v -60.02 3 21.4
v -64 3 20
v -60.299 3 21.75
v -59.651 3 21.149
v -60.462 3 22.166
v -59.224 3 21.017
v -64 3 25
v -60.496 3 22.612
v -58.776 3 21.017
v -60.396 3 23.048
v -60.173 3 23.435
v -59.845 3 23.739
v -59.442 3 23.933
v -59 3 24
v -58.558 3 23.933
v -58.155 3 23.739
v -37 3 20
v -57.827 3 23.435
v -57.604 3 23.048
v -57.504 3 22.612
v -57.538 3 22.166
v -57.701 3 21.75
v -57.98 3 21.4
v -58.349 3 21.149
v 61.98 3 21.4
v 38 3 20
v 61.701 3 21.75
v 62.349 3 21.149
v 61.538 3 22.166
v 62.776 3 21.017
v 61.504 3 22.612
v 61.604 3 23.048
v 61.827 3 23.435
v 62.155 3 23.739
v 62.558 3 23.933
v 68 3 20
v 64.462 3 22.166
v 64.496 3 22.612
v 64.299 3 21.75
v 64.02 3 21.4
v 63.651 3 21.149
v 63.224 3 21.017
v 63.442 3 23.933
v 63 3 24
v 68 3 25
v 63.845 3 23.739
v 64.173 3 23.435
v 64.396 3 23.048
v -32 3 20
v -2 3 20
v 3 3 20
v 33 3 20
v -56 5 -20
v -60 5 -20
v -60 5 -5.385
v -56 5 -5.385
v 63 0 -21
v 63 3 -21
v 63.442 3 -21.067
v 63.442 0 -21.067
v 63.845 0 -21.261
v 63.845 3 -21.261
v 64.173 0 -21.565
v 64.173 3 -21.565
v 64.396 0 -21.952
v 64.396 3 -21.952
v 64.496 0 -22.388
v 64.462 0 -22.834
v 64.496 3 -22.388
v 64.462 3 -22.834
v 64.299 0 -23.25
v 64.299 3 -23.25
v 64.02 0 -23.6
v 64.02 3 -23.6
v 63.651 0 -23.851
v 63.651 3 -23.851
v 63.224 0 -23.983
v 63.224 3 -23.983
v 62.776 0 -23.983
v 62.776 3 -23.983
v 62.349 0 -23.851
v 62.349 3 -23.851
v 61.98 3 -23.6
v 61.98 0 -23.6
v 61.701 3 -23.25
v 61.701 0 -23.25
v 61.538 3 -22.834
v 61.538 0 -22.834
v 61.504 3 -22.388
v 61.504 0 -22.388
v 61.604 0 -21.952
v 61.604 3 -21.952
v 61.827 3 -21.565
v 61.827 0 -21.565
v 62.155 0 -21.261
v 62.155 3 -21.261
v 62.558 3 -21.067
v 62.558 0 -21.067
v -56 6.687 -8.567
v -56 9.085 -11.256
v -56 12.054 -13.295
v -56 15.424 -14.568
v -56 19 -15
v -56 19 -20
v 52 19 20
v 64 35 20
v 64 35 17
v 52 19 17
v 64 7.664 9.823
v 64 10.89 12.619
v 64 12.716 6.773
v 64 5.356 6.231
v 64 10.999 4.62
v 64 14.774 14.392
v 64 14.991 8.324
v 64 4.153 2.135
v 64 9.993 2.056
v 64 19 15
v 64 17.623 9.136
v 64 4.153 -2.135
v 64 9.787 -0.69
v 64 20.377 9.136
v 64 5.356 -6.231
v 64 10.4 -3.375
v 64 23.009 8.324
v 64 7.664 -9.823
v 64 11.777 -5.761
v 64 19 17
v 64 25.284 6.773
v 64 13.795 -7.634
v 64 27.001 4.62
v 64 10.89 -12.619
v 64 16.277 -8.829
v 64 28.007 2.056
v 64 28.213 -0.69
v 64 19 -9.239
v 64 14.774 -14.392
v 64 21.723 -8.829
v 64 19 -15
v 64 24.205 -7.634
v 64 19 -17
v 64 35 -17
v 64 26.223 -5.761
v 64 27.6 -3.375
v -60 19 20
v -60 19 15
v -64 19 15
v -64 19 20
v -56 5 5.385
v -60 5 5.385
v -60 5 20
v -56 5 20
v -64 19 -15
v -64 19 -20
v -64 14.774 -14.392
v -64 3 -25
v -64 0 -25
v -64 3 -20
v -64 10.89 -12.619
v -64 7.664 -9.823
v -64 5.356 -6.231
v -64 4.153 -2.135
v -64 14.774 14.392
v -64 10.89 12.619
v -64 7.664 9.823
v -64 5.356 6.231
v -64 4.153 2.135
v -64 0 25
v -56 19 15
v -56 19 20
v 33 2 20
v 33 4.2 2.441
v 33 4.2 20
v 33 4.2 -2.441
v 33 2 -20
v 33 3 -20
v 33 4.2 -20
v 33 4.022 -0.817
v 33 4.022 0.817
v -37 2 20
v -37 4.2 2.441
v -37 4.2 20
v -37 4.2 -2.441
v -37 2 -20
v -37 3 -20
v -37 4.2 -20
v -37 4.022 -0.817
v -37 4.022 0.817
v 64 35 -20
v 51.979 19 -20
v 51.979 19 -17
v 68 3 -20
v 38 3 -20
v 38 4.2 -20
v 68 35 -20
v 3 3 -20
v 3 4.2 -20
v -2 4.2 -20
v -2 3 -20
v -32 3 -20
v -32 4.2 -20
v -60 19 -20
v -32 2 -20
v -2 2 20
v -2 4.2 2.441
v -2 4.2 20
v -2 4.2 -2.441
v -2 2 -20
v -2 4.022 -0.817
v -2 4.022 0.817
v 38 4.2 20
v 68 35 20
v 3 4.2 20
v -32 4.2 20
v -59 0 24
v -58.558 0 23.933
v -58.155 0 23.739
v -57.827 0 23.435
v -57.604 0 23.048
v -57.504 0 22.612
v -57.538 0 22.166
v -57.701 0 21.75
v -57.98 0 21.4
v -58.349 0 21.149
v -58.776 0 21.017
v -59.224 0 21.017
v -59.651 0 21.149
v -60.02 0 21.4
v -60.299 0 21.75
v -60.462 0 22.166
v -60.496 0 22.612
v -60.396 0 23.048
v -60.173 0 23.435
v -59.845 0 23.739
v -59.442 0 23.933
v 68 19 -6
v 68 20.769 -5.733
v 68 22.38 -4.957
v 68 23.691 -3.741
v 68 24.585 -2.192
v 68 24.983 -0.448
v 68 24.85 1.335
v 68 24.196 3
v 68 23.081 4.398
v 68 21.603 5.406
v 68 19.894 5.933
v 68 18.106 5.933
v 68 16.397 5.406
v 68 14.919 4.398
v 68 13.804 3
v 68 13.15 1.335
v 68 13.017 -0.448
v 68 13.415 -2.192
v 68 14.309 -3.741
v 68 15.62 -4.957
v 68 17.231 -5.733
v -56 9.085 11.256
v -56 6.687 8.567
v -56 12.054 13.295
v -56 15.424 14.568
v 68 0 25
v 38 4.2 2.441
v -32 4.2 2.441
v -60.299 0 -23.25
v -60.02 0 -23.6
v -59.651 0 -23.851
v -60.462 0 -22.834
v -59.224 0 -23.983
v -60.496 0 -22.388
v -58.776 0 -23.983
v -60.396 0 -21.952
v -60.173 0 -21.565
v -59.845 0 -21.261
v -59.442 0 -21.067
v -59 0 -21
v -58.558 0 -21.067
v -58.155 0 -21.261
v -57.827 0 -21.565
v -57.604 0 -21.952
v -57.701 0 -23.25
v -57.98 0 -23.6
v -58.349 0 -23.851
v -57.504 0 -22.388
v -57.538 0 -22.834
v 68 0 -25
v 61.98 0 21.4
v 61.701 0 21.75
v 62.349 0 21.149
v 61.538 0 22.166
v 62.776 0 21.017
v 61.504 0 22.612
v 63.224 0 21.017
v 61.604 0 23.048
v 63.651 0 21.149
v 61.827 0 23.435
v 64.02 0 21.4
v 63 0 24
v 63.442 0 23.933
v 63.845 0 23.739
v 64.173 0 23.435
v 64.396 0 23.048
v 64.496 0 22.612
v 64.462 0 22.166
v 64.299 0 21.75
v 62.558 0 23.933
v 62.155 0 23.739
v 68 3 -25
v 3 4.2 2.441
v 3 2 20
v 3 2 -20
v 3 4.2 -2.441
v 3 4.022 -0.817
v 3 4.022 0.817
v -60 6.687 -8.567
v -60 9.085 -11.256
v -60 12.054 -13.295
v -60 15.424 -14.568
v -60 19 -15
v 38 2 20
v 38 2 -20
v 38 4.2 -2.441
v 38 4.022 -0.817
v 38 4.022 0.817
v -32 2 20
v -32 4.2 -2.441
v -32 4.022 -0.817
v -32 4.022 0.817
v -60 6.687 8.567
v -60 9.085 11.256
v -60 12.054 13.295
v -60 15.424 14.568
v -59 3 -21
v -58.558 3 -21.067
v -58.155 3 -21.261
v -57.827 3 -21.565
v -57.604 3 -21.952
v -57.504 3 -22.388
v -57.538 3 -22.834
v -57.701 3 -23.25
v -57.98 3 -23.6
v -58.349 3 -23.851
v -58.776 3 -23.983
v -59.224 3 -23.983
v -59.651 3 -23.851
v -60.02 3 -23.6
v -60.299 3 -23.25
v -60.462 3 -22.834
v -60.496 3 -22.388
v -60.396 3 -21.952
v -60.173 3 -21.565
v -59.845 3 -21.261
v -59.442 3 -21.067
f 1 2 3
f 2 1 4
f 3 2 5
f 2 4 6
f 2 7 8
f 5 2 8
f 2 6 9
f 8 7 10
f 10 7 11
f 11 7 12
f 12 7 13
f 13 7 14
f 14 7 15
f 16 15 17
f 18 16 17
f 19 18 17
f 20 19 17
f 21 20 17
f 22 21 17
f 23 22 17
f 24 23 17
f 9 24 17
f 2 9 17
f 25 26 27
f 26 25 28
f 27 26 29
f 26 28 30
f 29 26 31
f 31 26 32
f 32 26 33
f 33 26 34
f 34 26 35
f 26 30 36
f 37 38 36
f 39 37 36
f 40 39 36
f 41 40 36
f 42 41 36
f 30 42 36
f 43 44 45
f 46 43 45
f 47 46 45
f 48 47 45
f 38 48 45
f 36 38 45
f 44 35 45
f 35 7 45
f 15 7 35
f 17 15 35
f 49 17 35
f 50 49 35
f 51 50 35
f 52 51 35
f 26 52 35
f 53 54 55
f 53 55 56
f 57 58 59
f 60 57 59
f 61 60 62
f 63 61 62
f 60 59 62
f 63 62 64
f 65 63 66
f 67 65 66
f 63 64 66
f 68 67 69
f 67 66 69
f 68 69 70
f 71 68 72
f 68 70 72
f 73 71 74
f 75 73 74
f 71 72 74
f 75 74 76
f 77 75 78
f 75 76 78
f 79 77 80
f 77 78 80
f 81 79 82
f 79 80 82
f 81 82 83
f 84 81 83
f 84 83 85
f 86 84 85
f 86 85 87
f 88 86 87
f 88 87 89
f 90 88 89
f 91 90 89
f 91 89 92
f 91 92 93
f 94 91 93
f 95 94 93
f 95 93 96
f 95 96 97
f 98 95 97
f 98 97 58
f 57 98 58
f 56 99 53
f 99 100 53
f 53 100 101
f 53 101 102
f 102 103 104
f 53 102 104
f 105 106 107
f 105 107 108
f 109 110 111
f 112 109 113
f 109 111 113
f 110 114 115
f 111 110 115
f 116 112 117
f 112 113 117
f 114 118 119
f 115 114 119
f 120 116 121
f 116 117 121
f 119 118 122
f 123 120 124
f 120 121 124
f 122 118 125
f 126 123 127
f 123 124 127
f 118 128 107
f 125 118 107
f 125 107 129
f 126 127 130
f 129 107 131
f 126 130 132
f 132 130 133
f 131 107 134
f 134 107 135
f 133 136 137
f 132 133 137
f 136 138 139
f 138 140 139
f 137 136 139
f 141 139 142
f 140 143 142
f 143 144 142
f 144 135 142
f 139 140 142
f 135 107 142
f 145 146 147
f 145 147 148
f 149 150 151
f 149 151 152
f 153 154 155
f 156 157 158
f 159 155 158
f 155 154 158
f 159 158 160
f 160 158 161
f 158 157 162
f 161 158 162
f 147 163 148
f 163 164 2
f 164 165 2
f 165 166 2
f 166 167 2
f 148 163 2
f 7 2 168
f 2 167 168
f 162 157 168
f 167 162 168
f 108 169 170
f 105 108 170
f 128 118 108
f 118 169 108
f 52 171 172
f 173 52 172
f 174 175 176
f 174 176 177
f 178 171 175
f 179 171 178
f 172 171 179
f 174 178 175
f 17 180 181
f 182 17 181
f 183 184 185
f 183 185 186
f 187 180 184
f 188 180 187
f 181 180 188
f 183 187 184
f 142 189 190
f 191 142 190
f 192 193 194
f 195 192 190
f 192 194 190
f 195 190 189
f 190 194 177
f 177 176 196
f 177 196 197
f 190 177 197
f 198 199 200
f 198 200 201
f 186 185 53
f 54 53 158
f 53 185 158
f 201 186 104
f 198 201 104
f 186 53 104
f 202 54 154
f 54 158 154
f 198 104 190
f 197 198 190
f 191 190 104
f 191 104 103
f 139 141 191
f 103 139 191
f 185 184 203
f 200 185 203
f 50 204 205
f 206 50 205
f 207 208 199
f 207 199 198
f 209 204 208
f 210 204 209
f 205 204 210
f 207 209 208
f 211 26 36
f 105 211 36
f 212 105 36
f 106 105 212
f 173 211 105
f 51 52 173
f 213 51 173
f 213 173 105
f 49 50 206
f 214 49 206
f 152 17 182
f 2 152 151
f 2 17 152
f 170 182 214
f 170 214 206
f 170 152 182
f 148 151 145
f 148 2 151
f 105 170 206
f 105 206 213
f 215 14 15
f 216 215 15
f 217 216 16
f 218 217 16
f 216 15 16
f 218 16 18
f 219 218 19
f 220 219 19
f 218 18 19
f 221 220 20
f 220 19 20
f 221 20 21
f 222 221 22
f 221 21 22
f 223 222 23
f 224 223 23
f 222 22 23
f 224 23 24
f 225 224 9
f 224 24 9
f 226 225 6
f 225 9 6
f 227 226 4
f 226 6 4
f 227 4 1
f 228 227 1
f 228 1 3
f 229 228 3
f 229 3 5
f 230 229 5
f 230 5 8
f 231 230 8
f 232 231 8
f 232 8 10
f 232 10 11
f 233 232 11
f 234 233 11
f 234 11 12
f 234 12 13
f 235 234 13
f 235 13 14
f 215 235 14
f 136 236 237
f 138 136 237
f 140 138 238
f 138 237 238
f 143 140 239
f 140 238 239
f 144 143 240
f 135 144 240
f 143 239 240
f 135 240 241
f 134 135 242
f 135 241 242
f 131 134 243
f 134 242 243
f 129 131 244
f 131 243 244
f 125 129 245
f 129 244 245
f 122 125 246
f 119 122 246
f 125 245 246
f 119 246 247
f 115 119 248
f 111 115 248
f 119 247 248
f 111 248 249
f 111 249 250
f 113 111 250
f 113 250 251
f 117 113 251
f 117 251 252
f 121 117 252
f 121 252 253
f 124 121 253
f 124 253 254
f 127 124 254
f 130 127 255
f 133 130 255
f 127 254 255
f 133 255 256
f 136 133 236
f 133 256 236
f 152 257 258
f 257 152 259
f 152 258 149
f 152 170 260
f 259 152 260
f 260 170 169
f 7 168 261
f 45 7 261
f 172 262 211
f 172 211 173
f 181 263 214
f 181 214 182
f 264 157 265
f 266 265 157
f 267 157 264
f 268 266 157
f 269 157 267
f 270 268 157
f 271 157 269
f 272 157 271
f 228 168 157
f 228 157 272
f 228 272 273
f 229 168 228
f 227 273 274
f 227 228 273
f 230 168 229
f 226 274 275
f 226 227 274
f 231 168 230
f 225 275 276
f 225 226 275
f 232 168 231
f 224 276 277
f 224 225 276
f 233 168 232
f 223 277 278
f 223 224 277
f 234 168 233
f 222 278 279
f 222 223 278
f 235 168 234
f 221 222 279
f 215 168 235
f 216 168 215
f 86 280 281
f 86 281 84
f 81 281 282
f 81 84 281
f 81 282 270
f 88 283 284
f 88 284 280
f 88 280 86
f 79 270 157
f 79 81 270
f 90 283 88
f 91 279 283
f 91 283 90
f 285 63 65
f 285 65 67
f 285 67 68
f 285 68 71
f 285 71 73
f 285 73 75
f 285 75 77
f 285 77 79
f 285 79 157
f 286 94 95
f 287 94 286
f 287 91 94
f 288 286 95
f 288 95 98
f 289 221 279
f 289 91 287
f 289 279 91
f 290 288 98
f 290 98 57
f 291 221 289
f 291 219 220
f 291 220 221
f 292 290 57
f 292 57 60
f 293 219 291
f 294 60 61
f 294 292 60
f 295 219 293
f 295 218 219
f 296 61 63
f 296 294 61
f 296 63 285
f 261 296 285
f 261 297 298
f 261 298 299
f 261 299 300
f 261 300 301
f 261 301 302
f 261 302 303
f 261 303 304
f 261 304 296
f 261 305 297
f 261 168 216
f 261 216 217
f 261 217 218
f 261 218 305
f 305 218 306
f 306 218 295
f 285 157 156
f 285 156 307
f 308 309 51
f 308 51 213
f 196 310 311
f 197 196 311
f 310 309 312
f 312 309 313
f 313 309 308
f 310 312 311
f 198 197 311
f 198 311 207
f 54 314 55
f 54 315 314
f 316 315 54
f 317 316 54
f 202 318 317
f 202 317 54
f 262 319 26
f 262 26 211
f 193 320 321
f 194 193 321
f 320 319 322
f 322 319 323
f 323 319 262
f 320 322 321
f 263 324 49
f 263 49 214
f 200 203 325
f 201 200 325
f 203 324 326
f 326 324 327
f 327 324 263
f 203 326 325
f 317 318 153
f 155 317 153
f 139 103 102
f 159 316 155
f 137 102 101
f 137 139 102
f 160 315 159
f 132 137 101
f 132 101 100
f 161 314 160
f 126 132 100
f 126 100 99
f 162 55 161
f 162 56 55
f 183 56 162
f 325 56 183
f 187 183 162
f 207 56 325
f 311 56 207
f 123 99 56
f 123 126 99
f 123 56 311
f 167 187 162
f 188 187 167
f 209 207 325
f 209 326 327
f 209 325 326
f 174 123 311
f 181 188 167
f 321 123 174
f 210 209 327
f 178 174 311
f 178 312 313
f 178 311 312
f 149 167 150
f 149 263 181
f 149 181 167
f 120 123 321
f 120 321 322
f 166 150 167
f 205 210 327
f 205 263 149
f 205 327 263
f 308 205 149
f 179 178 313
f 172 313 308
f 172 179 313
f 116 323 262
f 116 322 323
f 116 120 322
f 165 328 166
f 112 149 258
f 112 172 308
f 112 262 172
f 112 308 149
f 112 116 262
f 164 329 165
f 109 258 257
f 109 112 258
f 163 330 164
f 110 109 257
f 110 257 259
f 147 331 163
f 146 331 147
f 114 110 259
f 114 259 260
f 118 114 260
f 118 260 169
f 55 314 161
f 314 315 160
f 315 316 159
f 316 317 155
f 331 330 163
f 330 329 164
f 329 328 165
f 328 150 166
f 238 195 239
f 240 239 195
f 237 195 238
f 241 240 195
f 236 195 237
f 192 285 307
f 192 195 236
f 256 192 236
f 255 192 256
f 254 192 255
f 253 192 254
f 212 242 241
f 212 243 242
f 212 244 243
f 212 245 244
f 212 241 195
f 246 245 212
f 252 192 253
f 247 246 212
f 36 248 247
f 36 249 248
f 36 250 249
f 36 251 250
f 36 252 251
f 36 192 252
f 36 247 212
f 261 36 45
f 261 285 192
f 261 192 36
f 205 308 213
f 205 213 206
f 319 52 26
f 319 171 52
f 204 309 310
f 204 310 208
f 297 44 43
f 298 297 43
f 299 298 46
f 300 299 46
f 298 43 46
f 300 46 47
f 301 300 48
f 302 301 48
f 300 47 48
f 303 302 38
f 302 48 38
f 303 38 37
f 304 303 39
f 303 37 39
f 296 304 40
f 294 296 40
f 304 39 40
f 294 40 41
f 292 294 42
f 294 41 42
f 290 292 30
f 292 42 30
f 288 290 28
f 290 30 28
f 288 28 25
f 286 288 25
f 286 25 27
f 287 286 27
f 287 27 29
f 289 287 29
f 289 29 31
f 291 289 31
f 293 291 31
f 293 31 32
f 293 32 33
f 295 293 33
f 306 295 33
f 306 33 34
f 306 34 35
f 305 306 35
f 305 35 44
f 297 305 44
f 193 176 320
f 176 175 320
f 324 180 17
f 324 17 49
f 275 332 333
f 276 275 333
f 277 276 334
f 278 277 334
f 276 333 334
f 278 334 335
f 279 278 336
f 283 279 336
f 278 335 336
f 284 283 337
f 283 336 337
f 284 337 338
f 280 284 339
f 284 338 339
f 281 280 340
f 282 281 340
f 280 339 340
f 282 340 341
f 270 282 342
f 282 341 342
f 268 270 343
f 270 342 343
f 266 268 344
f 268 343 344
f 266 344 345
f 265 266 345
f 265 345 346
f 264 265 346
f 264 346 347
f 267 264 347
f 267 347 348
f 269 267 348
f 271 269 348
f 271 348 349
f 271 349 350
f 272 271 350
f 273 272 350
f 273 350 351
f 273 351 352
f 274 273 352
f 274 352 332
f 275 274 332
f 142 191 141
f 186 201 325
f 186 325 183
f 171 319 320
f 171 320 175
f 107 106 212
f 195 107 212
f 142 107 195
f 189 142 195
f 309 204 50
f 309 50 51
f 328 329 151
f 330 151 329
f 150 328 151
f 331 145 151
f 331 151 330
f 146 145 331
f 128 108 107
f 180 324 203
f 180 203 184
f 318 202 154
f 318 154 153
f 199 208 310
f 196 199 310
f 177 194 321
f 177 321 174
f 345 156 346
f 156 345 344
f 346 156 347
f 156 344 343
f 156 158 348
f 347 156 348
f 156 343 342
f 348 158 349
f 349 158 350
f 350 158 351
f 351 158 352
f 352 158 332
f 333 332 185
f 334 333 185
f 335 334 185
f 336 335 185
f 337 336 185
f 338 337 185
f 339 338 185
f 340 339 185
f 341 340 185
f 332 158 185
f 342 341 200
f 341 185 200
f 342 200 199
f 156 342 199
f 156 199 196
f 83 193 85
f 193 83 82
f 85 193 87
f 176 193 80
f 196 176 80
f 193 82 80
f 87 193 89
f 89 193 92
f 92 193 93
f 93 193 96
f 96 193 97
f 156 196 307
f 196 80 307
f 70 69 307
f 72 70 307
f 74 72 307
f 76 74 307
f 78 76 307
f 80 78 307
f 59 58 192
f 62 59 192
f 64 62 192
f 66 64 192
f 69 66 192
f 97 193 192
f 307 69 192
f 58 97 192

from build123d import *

# Parameters (mm, degrees)
SKETCH1_W           = 128
SKETCH1_H           = 40
BOSS_EXTRUDE1_DEPTH = 8
SKETCH2_W           = 128
SKETCH2_H           = 40
BOSS_EXTRUDE2_DEPTH = 30
CUT_EXTRUDE1_DEPTH  = 200000
SKETCH5_W           = 4
SKETCH5_H           = 40
CUT_EXTRUDE2_DEPTH  = 14
SKETCH6_W           = 40
SKETCH6_H           = 35
BOSS_EXTRUDE3_DEPTH = 4
SKETCH7_R           = 6
CUT_EXTRUDE3_DEPTH  = 4
CUT_EXTRUDE3_DRAFT  = 39
SKETCH8_W           = 5
SKETCH8_H           = 2.2
CUT_EXTRUDE4_DEPTH  = 200
SKETCH9_W           = 132
SKETCH9_H           = 5
BOSS_EXTRUDE4_DEPTH = 3
BOSS_EXTRUDE7_DEPTH = 3
BOSS_EXTRUDE9_DEPTH = 3
SKETCH13_R          = 1.5
CUT_EXTRUDE5_DEPTH  = 10


with BuildPart() as part:
    # Sketch1 → Boss-Extrude1 (new body)
    with BuildSketch(Plane(origin=(0, 0, 0), x_dir=(1, 0, 0), z_dir=(0, 1, 0))):
        Rectangle(SKETCH1_W, SKETCH1_H)
    extrude(amount=BOSS_EXTRUDE1_DEPTH)

    # Sketch2 → Boss-Extrude2 (add)
    with BuildSketch(Plane(origin=(0, 8, 0), x_dir=(1, 0, 0), z_dir=(0, 1, 0))):
        Rectangle(SKETCH2_W, SKETCH2_H)
    extrude(amount=BOSS_EXTRUDE2_DEPTH)

    # Sketch3 → Cut-Extrude1 (cut)
    with BuildSketch(Plane(origin=(64, 0, 0), x_dir=(0, 0, -1), z_dir=(1, 0, 0))):
        with BuildLine():
            Line((-15, 19), (-20, 19))
            Line((-20, 19), (-20, 38))
            Line((-20, 38), (20, 38))
            Line((20, 38), (20, 19))
            Line((20, 19), (15, 19))
            ThreePointArc((15, 19), (0, 4), (-15, 19))
        make_face()
    extrude(amount=-CUT_EXTRUDE1_DEPTH, mode=Mode.SUBTRACT)

    # Sketch5 → Cut-Extrude2 (cut)
    with BuildSketch(Plane(origin=(0, 19, 0), x_dir=(1, 0, 0), z_dir=(0, 1, 0))):
        with Locations((-58, 0)):
            Rectangle(SKETCH5_W, SKETCH5_H)
    extrude(amount=-CUT_EXTRUDE2_DEPTH, mode=Mode.SUBTRACT)

    # Sketch6 → Boss-Extrude3 (add)
    with BuildSketch(Plane(origin=(64, 0, 0), x_dir=(0, 0, -1), z_dir=(1, 0, 0))):
        with Locations((0, 17.5)):
            Rectangle(SKETCH6_W, SKETCH6_H)
    extrude(amount=BOSS_EXTRUDE3_DEPTH)


with BuildPart() as cut_extrude3_tool:
    # Sketch7 → Cut-Extrude3 (with draft: the straight prism first)
    with BuildSketch(Plane(origin=(68, 0, 0), x_dir=(0, 0, -1), z_dir=(1, 0, 0))):
        with Locations((0, 19)):
            Circle(SKETCH7_R)
    extrude(amount=-CUT_EXTRUDE3_DEPTH)
    # Cut-Extrude3: the draft: its side faces are tilted about the plane it starts from
    cut_extrude3_sides = [cut_extrude3_tool.faces().sort_by_distance(p)[0] for p in [
        (66, 19, 6),
    ]]
    draft(cut_extrude3_sides, Plane(origin=(68, 0, 0), x_dir=(0, 0, -1), z_dir=(1, 0, 0)), CUT_EXTRUDE3_DRAFT)


with BuildPart() as part_1:
    add(part.part)

    # Cut-Extrude3: cut by cut_extrude3_tool
    add(cut_extrude3_tool.part, mode=Mode.SUBTRACT)

    # Sketch8 → Cut-Extrude4 (cut)
    with BuildSketch(Plane(origin=(0, 0, -20), x_dir=(-1, 0, 0), z_dir=(0, 0, -1))):
        with Locations((-35.5, 3.1)):
            Rectangle(SKETCH8_W, SKETCH8_H)
        with Locations((34.5, 3.1)):
            Rectangle(SKETCH8_W, SKETCH8_H)
        with Locations((-0.5, 3.1)):
            Rectangle(SKETCH8_W, SKETCH8_H)
    extrude(amount=-CUT_EXTRUDE4_DEPTH, mode=Mode.SUBTRACT)

    # Sketch9 → Boss-Extrude4 (add)
    with BuildSketch(Plane.XZ):
        with Locations((2, 22.5)):
            Rectangle(SKETCH9_W, SKETCH9_H)
        with Locations((2, -22.5)):
            Rectangle(SKETCH9_W, SKETCH9_H)
    extrude(amount=-BOSS_EXTRUDE4_DEPTH)

    # Sketch10 → Boss-Extrude7 (add)
    with BuildSketch(Plane.XY.offset(20)):
        Polygon((68, 35), (64, 35), (52, 19), (68, 19), align=None)
    extrude(amount=-BOSS_EXTRUDE7_DEPTH)

    # Sketch12 → Boss-Extrude9 (add)
    with BuildSketch(Plane(origin=(0, 0, -20), x_dir=(-1, 0, 0), z_dir=(0, 0, -1))):
        Polygon((-68, 35), (-64, 35), (-51.978791145, 19), (-68, 19), align=None)
    extrude(amount=-BOSS_EXTRUDE9_DEPTH)

    # Sketch13 → Cut-Extrude5 (cut)
    with BuildSketch(Plane(origin=(0, 3, 0), x_dir=(1, 0, 0), z_dir=(0, 1, 0))):
        with Locations(Location((-59, -22.5, 0), (0, 0, 270))):
            Circle(SKETCH13_R)
        with Locations(Location((-59, 22.5, 0), (0, 0, 270))):
            Circle(SKETCH13_R)
        with Locations(Location((63, -22.5, 0), (0, 0, 270))):
            Circle(SKETCH13_R)
        with Locations(Location((63, 22.5, 0), (0, 0, 270))):
            Circle(SKETCH13_R)
    extrude(amount=-CUT_EXTRUDE5_DEPTH, mode=Mode.SUBTRACT)


solid = part_1.part
